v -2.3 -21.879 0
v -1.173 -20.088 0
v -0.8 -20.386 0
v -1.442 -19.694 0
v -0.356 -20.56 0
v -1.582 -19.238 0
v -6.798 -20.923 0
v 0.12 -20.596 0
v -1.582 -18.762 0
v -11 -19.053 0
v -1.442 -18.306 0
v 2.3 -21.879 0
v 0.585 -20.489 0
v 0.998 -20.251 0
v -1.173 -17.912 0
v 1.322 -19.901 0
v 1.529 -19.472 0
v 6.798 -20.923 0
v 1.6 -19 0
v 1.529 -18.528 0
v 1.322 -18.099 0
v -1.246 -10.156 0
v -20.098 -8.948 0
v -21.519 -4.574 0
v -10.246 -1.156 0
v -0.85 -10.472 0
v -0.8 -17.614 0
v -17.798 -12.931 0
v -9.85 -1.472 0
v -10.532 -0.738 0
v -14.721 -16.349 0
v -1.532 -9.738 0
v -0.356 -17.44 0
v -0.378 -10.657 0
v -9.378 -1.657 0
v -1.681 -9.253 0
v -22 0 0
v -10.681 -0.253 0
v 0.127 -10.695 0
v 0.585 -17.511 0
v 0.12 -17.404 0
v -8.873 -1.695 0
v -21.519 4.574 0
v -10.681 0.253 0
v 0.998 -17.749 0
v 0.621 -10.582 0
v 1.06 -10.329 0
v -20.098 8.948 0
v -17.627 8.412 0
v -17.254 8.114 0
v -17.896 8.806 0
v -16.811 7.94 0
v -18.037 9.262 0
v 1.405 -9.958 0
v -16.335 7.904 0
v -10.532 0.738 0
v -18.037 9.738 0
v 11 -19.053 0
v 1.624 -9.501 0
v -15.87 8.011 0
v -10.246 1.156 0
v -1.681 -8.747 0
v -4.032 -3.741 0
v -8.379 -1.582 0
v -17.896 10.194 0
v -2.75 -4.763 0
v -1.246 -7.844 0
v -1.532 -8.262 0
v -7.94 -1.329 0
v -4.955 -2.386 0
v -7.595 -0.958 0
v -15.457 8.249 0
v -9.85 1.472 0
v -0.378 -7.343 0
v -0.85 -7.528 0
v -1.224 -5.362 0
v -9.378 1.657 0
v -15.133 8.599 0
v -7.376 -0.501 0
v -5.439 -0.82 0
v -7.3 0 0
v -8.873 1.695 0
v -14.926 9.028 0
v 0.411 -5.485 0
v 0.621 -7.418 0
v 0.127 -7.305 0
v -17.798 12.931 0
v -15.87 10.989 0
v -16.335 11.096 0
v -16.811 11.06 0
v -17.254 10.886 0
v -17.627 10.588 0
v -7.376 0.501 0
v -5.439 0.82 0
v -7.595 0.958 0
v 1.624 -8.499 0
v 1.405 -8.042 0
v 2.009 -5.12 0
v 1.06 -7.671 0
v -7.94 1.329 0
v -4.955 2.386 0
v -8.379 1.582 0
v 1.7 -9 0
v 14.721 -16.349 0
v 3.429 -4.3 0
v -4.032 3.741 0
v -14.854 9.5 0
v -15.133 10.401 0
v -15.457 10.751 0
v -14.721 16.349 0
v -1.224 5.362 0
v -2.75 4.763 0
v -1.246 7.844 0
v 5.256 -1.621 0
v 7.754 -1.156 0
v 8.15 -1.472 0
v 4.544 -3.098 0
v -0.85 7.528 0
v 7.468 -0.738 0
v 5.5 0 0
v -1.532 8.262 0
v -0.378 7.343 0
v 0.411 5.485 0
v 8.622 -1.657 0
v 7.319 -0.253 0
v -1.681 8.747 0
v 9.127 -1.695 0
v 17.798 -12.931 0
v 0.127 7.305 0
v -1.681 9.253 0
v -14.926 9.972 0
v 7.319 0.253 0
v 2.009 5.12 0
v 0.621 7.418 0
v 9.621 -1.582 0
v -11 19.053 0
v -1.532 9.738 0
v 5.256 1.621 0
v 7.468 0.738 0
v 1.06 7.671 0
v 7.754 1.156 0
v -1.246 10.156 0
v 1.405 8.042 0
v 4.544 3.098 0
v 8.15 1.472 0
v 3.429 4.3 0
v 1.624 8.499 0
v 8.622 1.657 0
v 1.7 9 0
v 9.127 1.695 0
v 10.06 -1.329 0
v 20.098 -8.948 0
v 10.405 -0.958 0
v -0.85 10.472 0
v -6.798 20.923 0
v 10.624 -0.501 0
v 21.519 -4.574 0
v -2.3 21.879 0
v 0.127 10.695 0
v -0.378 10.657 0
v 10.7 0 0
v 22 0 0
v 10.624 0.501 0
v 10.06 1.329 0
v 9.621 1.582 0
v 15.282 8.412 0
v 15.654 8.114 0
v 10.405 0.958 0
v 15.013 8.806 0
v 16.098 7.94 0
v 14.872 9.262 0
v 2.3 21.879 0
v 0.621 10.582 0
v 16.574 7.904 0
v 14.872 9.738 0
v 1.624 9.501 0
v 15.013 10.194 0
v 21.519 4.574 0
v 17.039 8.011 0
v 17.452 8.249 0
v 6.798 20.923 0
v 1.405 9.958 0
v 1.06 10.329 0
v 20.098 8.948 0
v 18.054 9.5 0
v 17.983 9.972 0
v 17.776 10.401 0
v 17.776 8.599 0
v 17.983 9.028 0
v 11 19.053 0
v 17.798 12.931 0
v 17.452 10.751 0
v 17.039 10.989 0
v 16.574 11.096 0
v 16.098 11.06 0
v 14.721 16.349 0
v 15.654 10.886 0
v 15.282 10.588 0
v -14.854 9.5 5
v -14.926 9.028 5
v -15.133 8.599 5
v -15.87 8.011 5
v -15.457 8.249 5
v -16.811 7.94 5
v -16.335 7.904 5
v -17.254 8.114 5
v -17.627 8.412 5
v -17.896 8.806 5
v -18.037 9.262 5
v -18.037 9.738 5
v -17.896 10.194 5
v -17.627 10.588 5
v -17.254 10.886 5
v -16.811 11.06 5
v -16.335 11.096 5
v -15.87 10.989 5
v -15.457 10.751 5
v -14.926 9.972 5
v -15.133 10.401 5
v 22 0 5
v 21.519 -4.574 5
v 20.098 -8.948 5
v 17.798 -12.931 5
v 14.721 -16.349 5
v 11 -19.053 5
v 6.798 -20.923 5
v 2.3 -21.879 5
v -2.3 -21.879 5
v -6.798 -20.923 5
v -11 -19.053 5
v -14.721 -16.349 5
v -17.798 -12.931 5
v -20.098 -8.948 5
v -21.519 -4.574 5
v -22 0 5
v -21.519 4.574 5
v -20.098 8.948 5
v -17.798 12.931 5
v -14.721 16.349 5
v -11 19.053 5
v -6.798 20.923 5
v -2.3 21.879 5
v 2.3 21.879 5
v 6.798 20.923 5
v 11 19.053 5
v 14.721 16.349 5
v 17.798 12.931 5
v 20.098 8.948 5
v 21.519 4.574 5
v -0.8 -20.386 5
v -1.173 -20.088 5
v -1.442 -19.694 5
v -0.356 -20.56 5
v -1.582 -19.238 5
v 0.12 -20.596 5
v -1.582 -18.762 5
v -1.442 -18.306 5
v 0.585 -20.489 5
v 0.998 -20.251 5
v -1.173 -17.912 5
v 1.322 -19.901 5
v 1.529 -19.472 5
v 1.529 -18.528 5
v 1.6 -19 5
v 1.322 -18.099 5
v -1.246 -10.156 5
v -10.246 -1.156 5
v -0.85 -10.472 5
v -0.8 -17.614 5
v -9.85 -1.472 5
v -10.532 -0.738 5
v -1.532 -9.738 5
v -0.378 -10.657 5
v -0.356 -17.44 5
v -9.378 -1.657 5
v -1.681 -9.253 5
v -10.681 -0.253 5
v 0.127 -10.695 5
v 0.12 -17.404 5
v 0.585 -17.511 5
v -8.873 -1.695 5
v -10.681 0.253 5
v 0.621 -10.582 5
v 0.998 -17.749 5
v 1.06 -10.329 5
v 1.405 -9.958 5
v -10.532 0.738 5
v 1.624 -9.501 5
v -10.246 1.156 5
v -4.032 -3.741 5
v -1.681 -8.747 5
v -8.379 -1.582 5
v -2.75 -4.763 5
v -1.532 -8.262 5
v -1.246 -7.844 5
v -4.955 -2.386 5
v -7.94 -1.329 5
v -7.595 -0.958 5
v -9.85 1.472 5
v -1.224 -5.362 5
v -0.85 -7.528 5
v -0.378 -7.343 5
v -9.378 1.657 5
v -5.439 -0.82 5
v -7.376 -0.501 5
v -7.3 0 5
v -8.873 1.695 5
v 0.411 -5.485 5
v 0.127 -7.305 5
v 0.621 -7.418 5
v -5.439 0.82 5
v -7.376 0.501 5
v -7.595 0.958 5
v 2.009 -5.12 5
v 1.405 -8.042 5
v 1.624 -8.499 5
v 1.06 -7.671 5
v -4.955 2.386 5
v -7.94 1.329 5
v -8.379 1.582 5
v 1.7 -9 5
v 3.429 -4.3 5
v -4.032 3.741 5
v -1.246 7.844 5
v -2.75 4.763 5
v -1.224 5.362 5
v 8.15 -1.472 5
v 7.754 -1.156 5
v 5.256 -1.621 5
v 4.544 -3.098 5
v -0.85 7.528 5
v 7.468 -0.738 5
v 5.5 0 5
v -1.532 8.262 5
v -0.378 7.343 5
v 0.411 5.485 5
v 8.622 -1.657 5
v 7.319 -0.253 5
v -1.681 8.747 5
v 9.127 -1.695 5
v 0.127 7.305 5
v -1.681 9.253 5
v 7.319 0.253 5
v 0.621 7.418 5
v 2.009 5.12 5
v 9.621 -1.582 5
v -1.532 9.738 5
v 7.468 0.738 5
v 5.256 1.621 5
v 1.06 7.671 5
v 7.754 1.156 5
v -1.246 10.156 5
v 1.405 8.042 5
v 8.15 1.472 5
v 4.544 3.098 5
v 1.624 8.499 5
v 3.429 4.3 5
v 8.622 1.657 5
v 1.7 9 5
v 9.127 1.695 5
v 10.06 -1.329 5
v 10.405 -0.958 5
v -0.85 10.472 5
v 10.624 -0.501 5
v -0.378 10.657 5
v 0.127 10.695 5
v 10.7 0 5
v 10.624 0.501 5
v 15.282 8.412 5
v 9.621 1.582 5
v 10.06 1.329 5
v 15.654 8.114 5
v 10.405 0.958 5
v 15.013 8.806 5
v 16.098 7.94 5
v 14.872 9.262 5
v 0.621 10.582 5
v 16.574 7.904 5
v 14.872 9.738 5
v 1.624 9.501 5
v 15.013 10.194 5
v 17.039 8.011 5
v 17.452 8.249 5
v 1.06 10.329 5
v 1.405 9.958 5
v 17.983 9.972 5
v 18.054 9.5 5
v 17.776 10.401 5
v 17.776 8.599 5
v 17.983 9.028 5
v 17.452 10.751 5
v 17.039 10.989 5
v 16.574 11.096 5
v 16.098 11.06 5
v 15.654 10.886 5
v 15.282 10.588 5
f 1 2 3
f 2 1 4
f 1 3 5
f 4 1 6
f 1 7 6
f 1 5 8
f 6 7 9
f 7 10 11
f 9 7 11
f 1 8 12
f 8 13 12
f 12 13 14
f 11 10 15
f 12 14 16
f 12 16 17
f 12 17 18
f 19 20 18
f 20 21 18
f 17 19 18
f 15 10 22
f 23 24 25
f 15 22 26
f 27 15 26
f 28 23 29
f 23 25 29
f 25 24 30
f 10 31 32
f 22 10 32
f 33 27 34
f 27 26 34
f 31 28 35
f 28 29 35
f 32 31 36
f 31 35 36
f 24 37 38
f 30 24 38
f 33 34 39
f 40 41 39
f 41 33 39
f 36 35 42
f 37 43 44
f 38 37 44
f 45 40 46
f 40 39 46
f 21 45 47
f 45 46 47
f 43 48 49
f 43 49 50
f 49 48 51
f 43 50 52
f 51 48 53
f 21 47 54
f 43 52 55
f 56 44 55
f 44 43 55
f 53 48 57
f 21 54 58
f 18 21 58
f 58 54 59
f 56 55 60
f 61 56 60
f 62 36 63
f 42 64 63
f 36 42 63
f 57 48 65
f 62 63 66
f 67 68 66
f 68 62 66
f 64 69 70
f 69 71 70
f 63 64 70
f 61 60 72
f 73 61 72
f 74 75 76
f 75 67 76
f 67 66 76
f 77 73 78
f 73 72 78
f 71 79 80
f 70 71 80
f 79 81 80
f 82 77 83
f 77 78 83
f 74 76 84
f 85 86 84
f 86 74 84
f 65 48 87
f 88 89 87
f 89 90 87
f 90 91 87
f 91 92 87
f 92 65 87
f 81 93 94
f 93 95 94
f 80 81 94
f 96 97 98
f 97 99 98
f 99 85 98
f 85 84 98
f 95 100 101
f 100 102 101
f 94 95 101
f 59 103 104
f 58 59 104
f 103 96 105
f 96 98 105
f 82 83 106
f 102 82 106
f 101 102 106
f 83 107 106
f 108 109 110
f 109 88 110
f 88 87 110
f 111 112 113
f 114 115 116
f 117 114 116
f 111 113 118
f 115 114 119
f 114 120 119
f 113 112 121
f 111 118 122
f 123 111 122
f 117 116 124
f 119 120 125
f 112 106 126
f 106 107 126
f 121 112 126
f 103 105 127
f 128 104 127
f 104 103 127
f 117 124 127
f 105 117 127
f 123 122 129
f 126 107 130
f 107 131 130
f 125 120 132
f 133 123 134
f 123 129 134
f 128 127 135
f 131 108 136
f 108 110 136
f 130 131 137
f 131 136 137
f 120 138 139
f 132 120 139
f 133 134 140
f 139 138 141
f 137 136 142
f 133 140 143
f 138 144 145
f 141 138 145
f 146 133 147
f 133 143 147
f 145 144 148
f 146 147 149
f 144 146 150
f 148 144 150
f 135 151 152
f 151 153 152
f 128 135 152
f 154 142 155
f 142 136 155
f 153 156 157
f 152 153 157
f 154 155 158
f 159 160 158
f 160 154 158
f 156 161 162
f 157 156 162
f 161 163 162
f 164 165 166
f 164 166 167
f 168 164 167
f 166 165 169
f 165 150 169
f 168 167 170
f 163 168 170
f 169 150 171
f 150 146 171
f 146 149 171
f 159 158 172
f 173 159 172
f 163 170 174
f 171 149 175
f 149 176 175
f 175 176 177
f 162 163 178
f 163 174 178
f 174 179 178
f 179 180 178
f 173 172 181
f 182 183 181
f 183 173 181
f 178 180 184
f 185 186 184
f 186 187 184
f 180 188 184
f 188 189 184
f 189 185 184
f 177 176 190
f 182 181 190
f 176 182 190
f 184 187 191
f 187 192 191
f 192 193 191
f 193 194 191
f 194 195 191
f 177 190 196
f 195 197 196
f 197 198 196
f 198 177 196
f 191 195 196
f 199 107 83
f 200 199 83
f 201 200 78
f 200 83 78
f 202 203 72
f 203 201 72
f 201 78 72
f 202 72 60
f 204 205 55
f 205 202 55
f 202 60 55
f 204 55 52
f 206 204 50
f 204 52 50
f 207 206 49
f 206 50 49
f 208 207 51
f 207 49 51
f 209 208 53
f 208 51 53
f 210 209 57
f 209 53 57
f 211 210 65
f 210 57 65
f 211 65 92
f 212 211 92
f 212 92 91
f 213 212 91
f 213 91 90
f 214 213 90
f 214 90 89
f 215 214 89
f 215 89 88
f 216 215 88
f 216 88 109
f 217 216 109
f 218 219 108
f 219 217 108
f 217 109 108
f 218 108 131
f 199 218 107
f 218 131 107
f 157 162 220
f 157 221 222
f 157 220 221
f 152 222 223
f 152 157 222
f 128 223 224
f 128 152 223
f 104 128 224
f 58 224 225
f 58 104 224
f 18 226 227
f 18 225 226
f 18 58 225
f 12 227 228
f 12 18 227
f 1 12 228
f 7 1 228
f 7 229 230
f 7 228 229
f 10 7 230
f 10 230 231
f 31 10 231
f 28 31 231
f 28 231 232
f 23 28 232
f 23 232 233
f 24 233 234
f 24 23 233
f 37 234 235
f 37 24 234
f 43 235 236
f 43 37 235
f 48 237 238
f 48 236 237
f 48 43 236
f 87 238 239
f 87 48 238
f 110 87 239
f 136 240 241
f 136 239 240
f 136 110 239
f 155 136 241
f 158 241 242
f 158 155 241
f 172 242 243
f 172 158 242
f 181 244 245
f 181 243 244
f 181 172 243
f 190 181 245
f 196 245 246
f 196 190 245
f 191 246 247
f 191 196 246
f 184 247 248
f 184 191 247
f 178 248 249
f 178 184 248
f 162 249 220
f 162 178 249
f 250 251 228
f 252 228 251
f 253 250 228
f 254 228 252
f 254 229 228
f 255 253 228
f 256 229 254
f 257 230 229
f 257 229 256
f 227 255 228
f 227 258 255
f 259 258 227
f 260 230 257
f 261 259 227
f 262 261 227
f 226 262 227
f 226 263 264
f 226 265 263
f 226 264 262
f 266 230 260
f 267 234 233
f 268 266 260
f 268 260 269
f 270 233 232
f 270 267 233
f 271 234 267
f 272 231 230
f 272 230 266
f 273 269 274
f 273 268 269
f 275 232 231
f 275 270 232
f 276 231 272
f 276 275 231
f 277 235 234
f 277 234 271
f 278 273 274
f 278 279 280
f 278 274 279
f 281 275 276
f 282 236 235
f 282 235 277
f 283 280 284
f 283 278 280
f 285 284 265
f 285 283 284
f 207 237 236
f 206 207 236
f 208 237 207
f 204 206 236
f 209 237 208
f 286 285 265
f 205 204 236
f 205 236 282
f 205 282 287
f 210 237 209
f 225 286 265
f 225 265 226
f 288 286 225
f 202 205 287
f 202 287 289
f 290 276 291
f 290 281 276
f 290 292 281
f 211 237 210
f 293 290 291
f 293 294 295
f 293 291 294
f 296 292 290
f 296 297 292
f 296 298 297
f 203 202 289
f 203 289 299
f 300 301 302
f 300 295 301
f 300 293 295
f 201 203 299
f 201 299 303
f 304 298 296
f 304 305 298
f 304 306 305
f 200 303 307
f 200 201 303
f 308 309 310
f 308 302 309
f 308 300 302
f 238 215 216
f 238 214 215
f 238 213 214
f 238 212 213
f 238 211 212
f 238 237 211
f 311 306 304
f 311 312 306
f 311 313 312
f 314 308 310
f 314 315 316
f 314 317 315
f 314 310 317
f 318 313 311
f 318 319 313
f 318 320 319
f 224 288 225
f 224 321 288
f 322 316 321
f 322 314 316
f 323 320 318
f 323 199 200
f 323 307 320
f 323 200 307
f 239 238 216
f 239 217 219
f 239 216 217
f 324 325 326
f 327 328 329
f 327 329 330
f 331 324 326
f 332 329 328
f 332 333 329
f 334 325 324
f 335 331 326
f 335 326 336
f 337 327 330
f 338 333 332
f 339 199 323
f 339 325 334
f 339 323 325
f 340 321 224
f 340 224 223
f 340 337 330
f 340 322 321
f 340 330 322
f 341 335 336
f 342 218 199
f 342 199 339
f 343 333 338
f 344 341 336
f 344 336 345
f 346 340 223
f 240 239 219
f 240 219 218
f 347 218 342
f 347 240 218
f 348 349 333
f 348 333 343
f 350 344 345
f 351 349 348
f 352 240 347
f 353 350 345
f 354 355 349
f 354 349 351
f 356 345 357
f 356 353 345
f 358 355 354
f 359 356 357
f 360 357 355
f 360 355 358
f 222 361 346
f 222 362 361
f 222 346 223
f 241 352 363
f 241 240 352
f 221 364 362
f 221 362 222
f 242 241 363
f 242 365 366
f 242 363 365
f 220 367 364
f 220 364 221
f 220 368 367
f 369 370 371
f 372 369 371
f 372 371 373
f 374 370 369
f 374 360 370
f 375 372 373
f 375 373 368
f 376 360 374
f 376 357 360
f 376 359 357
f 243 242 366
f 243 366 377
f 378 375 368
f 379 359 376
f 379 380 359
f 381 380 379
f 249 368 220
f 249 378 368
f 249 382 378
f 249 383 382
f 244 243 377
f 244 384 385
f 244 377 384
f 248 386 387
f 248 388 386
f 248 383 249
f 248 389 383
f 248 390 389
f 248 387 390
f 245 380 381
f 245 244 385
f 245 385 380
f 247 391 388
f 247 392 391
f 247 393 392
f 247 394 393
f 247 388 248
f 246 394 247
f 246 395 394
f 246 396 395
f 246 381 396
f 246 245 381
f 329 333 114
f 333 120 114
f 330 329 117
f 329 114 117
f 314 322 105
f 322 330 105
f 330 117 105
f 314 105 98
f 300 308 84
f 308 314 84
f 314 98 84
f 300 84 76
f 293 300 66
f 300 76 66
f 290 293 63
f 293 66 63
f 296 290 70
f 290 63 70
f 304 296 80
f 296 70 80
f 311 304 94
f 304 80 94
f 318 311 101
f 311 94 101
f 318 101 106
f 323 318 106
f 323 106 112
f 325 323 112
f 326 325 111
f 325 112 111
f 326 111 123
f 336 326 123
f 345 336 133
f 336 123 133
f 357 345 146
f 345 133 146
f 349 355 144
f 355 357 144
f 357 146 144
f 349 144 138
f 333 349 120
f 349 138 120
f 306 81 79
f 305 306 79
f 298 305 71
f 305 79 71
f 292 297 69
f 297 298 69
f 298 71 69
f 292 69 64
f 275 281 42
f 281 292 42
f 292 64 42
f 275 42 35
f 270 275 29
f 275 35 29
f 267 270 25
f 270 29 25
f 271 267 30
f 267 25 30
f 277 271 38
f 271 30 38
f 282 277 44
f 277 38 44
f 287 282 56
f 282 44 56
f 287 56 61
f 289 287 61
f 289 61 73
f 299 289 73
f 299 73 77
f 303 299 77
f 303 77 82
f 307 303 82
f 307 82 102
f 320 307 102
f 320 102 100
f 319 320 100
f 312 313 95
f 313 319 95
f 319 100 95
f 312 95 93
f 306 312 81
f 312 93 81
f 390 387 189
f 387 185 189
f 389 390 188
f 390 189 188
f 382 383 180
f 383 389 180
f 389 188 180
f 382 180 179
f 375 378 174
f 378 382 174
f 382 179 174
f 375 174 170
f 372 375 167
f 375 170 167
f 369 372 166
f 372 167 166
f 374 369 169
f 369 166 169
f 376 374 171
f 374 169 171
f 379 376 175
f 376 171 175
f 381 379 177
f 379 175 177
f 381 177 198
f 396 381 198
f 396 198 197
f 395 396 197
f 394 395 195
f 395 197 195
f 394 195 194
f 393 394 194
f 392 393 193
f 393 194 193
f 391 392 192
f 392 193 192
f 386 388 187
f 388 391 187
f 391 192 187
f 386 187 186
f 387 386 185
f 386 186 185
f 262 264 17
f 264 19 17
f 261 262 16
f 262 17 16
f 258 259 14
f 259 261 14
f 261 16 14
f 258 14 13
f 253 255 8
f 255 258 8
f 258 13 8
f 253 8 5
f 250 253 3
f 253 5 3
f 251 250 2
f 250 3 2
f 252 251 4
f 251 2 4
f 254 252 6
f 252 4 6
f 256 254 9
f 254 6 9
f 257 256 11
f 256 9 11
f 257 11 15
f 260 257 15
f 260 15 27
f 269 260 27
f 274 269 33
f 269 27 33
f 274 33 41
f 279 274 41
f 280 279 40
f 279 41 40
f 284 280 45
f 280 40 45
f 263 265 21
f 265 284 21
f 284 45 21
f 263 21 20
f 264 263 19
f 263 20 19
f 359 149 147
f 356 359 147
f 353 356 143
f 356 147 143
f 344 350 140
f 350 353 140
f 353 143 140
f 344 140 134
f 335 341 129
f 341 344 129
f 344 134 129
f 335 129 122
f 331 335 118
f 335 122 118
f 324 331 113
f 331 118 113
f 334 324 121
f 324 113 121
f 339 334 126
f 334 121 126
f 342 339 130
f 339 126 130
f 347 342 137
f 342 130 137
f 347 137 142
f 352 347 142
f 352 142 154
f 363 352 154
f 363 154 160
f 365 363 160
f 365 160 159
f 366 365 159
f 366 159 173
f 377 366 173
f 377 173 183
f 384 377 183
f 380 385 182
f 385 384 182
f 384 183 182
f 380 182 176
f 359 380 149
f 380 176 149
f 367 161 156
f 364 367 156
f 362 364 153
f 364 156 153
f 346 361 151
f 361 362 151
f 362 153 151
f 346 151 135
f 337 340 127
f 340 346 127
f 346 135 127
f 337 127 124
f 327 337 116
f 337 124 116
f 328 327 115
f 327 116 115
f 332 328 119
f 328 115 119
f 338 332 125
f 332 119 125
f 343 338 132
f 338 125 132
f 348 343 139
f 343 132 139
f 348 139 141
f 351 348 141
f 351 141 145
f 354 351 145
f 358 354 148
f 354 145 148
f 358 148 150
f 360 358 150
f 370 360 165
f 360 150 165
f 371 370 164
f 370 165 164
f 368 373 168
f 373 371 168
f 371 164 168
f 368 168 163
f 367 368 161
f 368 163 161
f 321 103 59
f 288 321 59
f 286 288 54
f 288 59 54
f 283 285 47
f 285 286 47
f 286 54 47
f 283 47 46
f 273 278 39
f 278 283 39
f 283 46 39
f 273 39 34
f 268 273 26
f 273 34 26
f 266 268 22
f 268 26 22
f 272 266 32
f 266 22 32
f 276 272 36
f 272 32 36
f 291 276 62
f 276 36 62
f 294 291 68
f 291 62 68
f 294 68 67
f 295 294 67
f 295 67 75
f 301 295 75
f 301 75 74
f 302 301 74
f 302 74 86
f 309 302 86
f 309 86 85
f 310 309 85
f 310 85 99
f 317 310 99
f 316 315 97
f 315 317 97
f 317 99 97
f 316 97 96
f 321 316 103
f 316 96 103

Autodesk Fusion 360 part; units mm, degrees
sketch "Esquisse1" plane through (0, 0, 0) normal (0, 0, 1) x (1, 0, 0)
  circle A0 centre (0, 0) radius 22
  circle A1 centre (0, -9) radius 1.7
  circle A2 centre (0, 0) radius 5.5
  circle A3 centre (9, 0) radius 1.7
  circle A4 centre (0, 9) radius 1.7
  circle A5 centre (-9, 0) radius 1.7
  line L0 (0, 0) -> (0, -22) construction
  line L1 (0, 0) -> (0, -20) construction
  line L2 (0, 0) -> (20, 0) construction
  circle A6 centre (0, -19) radius 1.6
  circle A7 centre (16.4545, 9.5) radius 1.6
  circle A8 centre (-16.4545, 9.5) radius 1.6
  point P0 (2.1213, -9.1924)
  point P1 (9.1924, -2.1213)
  point P2 (2.1213, -9.1924)
  point P3 (9.1924, -2.1213)
  point P4 (6.364, -13.435)
  point P5 (13.435, -6.364)
  dimension "d1" = 44
  dimension "d2" = 3.4
  dimension "d3" = 9
  dimension "d4" = 11
  dimension "d6" = 360
  dimension "d17" = 90
  dimension "d18" = 3.2
  dimension "d19" = 19
  dimension "d21" = 360
extrude "Extrusion1" add sketch "Esquisse1" along normal blind 5
